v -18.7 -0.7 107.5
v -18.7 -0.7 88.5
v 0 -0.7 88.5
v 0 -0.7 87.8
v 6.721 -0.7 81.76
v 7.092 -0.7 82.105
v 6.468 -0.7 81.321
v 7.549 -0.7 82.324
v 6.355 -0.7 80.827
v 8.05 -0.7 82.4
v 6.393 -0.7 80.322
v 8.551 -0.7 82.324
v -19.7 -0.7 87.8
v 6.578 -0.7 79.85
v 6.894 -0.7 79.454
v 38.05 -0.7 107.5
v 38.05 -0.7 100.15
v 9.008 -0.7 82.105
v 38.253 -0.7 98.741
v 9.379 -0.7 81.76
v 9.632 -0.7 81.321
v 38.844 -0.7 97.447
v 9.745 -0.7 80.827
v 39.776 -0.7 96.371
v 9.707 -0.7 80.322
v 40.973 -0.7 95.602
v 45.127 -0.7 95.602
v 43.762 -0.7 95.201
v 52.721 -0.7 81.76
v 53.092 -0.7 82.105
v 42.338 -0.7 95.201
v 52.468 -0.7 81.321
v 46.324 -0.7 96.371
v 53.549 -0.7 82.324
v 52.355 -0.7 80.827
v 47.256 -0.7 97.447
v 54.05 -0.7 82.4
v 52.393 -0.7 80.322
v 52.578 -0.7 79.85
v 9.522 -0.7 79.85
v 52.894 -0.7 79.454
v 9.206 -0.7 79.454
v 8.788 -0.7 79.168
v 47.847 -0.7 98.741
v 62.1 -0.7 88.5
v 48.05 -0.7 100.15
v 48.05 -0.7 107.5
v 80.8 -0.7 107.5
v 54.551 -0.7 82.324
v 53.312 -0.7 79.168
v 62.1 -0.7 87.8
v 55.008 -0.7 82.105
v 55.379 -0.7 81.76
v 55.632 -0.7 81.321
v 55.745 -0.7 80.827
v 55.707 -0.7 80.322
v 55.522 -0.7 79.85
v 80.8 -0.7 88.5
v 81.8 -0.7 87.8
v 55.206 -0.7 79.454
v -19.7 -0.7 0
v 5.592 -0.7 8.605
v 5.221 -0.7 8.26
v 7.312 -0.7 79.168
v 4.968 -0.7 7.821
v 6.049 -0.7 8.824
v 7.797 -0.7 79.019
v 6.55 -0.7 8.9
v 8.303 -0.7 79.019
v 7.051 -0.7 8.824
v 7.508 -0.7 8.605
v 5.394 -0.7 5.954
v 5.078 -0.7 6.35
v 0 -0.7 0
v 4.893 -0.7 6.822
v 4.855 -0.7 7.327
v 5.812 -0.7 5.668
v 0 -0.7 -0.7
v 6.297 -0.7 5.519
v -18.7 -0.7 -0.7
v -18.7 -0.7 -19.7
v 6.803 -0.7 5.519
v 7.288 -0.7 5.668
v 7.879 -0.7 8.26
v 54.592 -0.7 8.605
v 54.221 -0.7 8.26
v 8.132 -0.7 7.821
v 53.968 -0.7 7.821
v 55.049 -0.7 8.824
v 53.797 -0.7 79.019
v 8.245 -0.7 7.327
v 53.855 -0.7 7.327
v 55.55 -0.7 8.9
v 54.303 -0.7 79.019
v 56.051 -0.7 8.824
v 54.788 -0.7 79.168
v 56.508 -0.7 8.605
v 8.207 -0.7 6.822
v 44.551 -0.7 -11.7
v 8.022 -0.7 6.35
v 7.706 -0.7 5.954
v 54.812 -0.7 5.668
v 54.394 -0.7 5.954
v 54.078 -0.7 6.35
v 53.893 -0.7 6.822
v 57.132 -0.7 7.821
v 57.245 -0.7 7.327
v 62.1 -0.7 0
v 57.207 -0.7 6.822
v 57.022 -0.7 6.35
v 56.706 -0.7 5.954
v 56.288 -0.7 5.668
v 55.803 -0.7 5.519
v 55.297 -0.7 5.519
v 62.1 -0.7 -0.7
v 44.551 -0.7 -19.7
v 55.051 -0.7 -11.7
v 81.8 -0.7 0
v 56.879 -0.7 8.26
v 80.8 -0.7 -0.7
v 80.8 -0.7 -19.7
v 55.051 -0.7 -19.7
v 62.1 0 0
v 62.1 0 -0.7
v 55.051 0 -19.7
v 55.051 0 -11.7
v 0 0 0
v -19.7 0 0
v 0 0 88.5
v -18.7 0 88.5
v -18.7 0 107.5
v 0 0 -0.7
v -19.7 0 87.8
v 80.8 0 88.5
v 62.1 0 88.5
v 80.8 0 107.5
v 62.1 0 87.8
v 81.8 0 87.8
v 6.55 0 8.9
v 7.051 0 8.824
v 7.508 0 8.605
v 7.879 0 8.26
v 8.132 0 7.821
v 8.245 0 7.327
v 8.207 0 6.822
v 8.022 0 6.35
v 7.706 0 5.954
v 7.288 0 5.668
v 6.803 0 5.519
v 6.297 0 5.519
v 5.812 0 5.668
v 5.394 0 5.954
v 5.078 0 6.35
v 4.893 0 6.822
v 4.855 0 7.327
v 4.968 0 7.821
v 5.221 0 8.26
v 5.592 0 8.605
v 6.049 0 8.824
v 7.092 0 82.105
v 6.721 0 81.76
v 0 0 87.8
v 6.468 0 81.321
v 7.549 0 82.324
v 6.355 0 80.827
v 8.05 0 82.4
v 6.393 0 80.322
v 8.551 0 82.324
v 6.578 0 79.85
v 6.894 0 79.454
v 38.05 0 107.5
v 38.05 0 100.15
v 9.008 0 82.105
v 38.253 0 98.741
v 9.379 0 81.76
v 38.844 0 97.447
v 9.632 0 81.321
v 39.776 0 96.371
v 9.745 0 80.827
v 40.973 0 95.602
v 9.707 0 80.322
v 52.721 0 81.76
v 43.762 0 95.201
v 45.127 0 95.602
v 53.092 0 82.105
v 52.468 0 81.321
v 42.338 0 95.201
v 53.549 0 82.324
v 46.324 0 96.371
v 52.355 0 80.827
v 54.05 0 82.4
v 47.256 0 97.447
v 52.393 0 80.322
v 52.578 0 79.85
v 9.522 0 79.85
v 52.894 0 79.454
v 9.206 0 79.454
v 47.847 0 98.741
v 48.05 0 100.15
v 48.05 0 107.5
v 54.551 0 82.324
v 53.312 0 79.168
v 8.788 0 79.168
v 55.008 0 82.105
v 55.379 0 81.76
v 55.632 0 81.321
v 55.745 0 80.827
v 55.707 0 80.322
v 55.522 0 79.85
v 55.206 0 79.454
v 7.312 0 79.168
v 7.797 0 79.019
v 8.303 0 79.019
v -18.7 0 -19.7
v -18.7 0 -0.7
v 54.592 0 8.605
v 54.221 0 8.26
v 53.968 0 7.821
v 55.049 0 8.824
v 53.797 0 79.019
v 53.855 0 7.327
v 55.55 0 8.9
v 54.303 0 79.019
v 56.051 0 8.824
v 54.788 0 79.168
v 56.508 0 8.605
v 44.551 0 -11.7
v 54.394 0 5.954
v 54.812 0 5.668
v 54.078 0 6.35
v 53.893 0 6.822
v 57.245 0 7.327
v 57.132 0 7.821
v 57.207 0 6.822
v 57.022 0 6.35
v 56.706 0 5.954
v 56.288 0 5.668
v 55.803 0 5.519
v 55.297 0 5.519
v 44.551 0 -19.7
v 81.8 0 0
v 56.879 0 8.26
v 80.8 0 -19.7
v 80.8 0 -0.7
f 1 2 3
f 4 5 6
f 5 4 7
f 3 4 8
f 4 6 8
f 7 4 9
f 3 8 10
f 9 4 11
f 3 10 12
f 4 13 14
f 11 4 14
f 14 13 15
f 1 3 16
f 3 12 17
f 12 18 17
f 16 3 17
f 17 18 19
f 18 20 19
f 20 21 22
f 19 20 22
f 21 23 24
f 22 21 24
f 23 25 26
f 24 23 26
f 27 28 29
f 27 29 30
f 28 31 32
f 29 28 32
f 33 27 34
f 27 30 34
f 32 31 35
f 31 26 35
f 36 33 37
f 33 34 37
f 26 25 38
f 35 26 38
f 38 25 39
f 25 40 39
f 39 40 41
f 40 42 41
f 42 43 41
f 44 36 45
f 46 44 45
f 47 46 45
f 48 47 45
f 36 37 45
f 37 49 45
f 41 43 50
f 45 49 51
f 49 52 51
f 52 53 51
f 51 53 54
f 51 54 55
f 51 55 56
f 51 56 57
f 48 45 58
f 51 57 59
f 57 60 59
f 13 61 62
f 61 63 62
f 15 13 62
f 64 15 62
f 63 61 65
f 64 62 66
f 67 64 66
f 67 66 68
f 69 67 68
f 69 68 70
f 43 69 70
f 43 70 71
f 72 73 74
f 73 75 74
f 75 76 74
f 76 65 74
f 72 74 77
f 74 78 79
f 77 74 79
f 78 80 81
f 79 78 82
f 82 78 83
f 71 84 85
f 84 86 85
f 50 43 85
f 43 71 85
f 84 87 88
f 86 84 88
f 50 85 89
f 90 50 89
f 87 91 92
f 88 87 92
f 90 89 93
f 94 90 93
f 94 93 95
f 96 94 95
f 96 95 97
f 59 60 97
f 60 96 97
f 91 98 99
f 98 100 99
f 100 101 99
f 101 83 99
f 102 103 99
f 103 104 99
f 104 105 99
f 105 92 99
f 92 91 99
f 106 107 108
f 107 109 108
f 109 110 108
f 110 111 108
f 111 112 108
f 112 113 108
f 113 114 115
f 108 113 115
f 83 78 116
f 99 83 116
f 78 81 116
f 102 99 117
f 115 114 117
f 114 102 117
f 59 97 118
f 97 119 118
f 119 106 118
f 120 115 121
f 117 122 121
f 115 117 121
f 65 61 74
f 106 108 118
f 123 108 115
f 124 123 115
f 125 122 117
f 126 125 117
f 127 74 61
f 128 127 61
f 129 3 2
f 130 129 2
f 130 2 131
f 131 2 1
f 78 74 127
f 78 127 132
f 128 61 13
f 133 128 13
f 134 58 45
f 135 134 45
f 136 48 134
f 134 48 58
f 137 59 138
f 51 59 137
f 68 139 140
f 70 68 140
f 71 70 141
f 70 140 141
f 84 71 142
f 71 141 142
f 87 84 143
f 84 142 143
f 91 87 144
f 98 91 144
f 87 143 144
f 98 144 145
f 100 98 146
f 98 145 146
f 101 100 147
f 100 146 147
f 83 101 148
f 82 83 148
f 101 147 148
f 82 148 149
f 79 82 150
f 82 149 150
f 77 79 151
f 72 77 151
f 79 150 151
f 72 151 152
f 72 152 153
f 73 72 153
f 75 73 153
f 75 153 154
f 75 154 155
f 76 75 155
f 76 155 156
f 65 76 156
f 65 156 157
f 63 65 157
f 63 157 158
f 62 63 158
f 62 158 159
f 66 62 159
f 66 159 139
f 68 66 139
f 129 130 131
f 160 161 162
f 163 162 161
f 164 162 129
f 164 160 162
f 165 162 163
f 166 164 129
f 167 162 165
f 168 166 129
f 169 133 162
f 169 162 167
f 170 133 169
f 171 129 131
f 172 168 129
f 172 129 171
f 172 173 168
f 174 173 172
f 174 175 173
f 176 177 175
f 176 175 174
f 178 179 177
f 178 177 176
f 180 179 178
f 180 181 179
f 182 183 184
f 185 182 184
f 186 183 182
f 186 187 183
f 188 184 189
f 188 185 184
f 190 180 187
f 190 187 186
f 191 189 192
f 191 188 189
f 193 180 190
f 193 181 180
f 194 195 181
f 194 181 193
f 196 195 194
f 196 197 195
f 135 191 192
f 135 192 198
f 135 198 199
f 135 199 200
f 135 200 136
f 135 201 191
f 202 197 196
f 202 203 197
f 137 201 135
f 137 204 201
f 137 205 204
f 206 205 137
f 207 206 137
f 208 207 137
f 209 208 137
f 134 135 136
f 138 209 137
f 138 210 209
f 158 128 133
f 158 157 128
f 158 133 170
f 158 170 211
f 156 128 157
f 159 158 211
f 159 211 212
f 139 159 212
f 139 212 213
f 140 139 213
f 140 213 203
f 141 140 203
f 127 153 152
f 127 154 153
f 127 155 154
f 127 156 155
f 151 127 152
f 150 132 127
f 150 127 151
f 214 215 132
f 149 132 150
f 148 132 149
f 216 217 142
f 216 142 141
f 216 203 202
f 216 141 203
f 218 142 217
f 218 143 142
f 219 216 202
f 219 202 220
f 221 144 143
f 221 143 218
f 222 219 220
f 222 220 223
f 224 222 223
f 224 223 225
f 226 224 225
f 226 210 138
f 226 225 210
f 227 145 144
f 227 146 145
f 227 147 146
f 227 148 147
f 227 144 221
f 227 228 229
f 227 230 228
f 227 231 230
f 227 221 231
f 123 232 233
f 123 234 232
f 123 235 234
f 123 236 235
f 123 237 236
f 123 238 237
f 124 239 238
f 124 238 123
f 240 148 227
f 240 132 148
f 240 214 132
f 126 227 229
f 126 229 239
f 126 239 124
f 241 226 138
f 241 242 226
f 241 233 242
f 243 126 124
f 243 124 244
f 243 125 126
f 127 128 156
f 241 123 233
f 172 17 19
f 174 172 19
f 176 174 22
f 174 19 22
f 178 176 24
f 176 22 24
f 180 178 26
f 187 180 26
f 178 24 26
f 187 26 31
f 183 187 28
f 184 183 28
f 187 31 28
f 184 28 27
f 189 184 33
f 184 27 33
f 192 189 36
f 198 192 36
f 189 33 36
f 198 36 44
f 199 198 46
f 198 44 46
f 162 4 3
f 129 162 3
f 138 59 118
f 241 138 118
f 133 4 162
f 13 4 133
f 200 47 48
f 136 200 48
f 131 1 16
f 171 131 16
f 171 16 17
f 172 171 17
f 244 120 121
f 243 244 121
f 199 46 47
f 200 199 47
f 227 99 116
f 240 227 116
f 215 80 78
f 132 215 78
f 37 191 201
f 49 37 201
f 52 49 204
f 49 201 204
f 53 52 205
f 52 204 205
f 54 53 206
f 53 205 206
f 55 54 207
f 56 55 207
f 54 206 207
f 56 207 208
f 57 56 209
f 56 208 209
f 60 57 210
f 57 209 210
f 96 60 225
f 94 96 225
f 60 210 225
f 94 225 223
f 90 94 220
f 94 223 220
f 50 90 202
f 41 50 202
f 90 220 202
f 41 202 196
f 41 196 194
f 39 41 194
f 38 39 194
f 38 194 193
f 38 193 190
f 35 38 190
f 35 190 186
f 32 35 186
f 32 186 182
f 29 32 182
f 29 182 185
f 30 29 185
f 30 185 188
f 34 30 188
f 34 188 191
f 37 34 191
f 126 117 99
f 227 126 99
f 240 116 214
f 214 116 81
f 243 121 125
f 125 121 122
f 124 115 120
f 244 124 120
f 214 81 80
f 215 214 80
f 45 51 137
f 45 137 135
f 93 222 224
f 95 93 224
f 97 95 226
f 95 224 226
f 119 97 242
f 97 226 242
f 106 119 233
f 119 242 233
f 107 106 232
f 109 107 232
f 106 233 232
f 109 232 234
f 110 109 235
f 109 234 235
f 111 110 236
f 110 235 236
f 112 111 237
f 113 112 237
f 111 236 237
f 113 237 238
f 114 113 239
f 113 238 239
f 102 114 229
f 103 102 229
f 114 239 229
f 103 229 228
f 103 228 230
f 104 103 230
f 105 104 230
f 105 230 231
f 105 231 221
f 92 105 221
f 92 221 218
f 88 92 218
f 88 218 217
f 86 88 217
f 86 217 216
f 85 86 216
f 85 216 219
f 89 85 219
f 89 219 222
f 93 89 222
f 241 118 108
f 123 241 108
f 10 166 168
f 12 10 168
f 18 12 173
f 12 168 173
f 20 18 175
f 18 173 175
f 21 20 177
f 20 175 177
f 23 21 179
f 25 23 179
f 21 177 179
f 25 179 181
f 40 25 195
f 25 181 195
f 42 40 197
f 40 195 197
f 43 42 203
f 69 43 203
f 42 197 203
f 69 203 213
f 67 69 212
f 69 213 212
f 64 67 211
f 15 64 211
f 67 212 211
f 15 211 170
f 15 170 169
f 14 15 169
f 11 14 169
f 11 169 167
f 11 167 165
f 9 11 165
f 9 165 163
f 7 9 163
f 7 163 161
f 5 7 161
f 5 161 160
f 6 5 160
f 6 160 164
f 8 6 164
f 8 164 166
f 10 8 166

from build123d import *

# Parameters (mm, degrees)
SKETCH1_W                 = 62.1
SKETCH1_H                 = 0.7
BASE_FLANGE1_DEPTH        = 87.8
EDGE_FLANGE1_DEPTH        = 87.8
EDGE_FLANGE2_DEPTH        = 87.8
EDGE_FLANGE3_DEPTH        = 62.1
CUT_EXTRUDE2_DEPTH        = 0.7
SKETCH14_R                = 1.7
CUT_EXTRUDE3_DEPTH        = 0.7
EDGE_FLANGE4_DEPTH        = 19
EDGE_FLANGE5_DEPTH        = 19
EDGE_FLANGE6_DEPTH        = 62.1
EDGE_FLANGE7_DEPTH        = 19
EDGE_FLANGE8_DEPTH        = 19
SKETCH32_W                = 10.5
SKETCH32_H                = 8
CUT_EXTRUDE5_DEPTH        = 0.7
FLAT_PATTERN1_START       = -20.7
FLAT_PATTERN1_OUTLINE_R   = 1.7
FLAT_PATTERN1_DEPTH       = 20
FLAT_PATTERN1_START_2     = -0.7
FLAT_PATTERN1_2_OUTLINE_R = 1.7
FLAT_PATTERN1_2_DEPTH     = 0.7


with BuildPart() as part:
    # Base-Flange1: sheet metal written as solids
    # Sketch1 → Base-Flange1 (new body)
    with BuildSketch(Plane.XY):
        with Locations((31.05, -0.35)):
            Rectangle(SKETCH1_W, SKETCH1_H)
    extrude(amount=BASE_FLANGE1_DEPTH)

    # Edge-Flange1: sheet metal written as solids
    # Edge-Flange1 section (on a plane across the edge) → Edge-Flange1 (add)
    with BuildSketch(Plane(origin=(63.1, -0.7, 0), x_dir=(-1, 0, 0), z_dir=(0, 0, 1))):
        with BuildLine():
            Line((-0.7, 1), (-0.7, 20))
            Line((-0.7, 20), (0, 20))
            Line((0, 20), (0, 1))
            ThreePointArc((0, 1), (0.292893219, 0.292893219), (1, 0))
            Line((1, 0), (1, -0.7))
            ThreePointArc((1, -0.7), (-0.202081528, -0.202081528), (-0.7, 1))
        make_face()
    extrude(amount=EDGE_FLANGE1_DEPTH)

    # Edge-Flange2: sheet metal written as solids
    # Edge-Flange2 section (on a plane across the edge) → Edge-Flange2 (add)
    with BuildSketch(Plane(origin=(-1, -0.7, 87.8), x_dir=(1, 0, 0), z_dir=(0, 0, -1))):
        with BuildLine():
            Line((-0.7, 1), (-0.7, 20))
            Line((-0.7, 20), (0, 20))
            Line((0, 20), (0, 1))
            ThreePointArc((0, 1), (0.292893219, 0.292893219), (1, 0))
            Line((1, 0), (1, -0.7))
            ThreePointArc((1, -0.7), (-0.202081528, -0.202081528), (-0.7, 1))
        make_face()
    extrude(amount=EDGE_FLANGE2_DEPTH)

    # Edge-Flange3: sheet metal written as solids
    # Edge-Flange3 section (on a plane across the edge) → Edge-Flange3 (add)
    with BuildSketch(Plane(origin=(62.1, -0.7, 88.8), x_dir=(0, 0, -1), z_dir=(-1, 0, 0))):
        with BuildLine():
            Line((-0.7, 1), (-0.7, 20))
            Line((-0.7, 20), (0, 20))
            Line((0, 20), (0, 1))
            ThreePointArc((0, 1), (0.292893219, 0.292893219), (1, 0))
            Line((1, 0), (1, -0.7))
            ThreePointArc((1, -0.7), (-0.202081528, -0.202081528), (-0.7, 1))
        make_face()
    extrude(amount=EDGE_FLANGE3_DEPTH)

    # Sketch13 → Cut-Extrude2 (cut)
    with BuildSketch(Plane.XY.offset(89.5)):
        with BuildLine():
            Line((38.05, -13.35), (38.05, -20.7))
            Line((38.05, -20.7), (48.05, -20.7))
            Line((48.05, -20.7), (48.05, -13.35))
            ThreePointArc((48.05, -13.35), (43.05, -8.35), (38.05, -13.35))
        make_face()
    extrude(amount=-CUT_EXTRUDE2_DEPTH, mode=Mode.SUBTRACT)

    # Sketch14 → Cut-Extrude3 (cut)
    with BuildSketch(Plane(origin=(0, 0, 0), x_dir=(1, 0, 0), z_dir=(0, 1, 0))):
        with Locations(Location((6.55, -7.2, 0), (0, 0, 270))):
            Circle(SKETCH14_R)
        with Locations(Location((55.55, -7.2, 0), (0, 0, 270))):
            Circle(SKETCH14_R)
        with Locations(Location((8.05, -80.7, 0), (0, 0, 270))):
            Circle(SKETCH14_R)
        with Locations(Location((54.05, -80.7, 0), (0, 0, 270))):
            Circle(SKETCH14_R)
    extrude(amount=-CUT_EXTRUDE3_DEPTH, mode=Mode.SUBTRACT)

    # Edge-Flange4: sheet metal written as solids
    # Edge-Flange4 section (on a plane across the edge) → Edge-Flange4 (add)
    with BuildSketch(Plane(origin=(64.1, -1.7, 88.8), x_dir=(-1, 0, 0), z_dir=(0, -1, 0))):
        with BuildLine():
            Line((-0.7, 2), (-0.7, 20))
            Line((-0.7, 20), (0, 20))
            Line((0, 20), (0, 2))
            ThreePointArc((0, 2), (0.585786438, 0.585786438), (2, 0))
            Line((2, 0), (2, -0.7))
            ThreePointArc((2, -0.7), (0.090811691, 0.090811691), (-0.7, 2))
        make_face()
    extrude(amount=EDGE_FLANGE4_DEPTH)

    # Edge-Flange5: sheet metal written as solids
    # Edge-Flange5 section (on a plane across the edge) → Edge-Flange5 (add)
    with BuildSketch(Plane(origin=(-2, -20.7, 88.8), x_dir=(1, 0, 0), z_dir=(0, 1, 0))):
        with BuildLine():
            Line((-0.7, 2), (-0.7, 20))
            Line((-0.7, 20), (0, 20))
            Line((0, 20), (0, 2))
            ThreePointArc((0, 2), (0.585786438, 0.585786438), (2, 0))
            Line((2, 0), (2, -0.7))
            ThreePointArc((2, -0.7), (0.090811691, 0.090811691), (-0.7, 2))
        make_face()
    extrude(amount=EDGE_FLANGE5_DEPTH)

    # Edge-Flange6: sheet metal written as solids
    # Edge-Flange6 section (on a plane across the edge) → Edge-Flange6 (add)
    with BuildSketch(Plane(origin=(0, -0.7, -1), x_dir=(0, 0, 1), z_dir=(1, 0, 0))):
        with BuildLine():
            Line((-0.7, 1), (-0.7, 20))
            Line((-0.7, 20), (0, 20))
            Line((0, 20), (0, 1))
            ThreePointArc((0, 1), (0.292893219, 0.292893219), (1, 0))
            Line((1, 0), (1, -0.7))
            ThreePointArc((1, -0.7), (-0.202081528, -0.202081528), (-0.7, 1))
        make_face()
    extrude(amount=EDGE_FLANGE6_DEPTH)

    # Edge-Flange7: sheet metal written as solids
    # Edge-Flange7 section (on a plane across the edge) → Edge-Flange7 (add)
    with BuildSketch(Plane(origin=(64.1, -20.7, -1), x_dir=(-1, 0, 0), z_dir=(0, 1, 0))):
        with BuildLine():
            Line((-0.7, 2), (-0.7, 20))
            Line((-0.7, 20), (0, 20))
            Line((0, 20), (0, 2))
            ThreePointArc((0, 2), (0.585786438, 0.585786438), (2, 0))
            Line((2, 0), (2, -0.7))
            ThreePointArc((2, -0.7), (0.090811691, 0.090811691), (-0.7, 2))
        make_face()
    extrude(amount=EDGE_FLANGE7_DEPTH)

    # Edge-Flange8: sheet metal written as solids
    # Edge-Flange8 section (on a plane across the edge) → Edge-Flange8 (add)
    with BuildSketch(Plane(origin=(-2, -1.7, -1), x_dir=(1, 0, 0), z_dir=(0, -1, 0))):
        with BuildLine():
            Line((-0.7, 2), (-0.7, 20))
            Line((-0.7, 20), (0, 20))
            Line((0, 20), (0, 2))
            ThreePointArc((0, 2), (0.585786438, 0.585786438), (2, 0))
            Line((2, 0), (2, -0.7))
            ThreePointArc((2, -0.7), (0.090811691, 0.090811691), (-0.7, 2))
        make_face()
    extrude(amount=EDGE_FLANGE8_DEPTH)

    # Sketch32 → Cut-Extrude5 (cut)
    with BuildSketch(Plane(origin=(0, 0, -1.7), x_dir=(-1, 0, 0), z_dir=(0, 0, -1))):
        with Locations((-49.8006007, -16.7)):
            Rectangle(SKETCH32_W, SKETCH32_H)
    extrude(amount=-CUT_EXTRUDE5_DEPTH, mode=Mode.SUBTRACT)

    # Flat-Pattern1: read off the stored shape, not the designer's step
    # Flat-Pattern1 outline → Flat-Pattern1 (cut)
    with BuildSketch(Plane(origin=(0, 0, 0), x_dir=(1, 0, 0), z_dir=(0, 1, 0)).offset(FLAT_PATTERN1_START)):
        with BuildLine():
            Line((-1.7, 0), (-1.7, -87.8))
            Line((-1.7, -87.8), (0, -87.8))
            Line((0, -87.8), (0, -88.5))
            Line((0, -88.5), (-1.053565375, -88.5))
            ThreePointArc((-1.053565375, -88.5), (-1.747445385, -87.772848716), (-2, -86.8))
            Line((-2, -86.8), (-2, -68.8))
            Line((-2, -68.8), (-2.7, -68.8))
            Line((-2.7, -68.8), (-2.7, -86.8))
            ThreePointArc((-2.7, -86.8), (-2.54495263, -87.701784958), (-2.097617696, -88.5))
            Line((-2.097617696, -88.5), (-18.7, -88.5))
            Line((-18.7, -88.5), (-18.7, -107.5))
            Line((-18.7, -107.5), (38.05, -107.5))
            Line((38.05, -107.5), (38.05, -100.15))
            ThreePointArc((38.05, -100.15), (43.05, -95.15), (48.05, -100.15))
            Line((48.05, -100.15), (48.05, -107.5))
            Line((48.05, -107.5), (80.8, -107.5))
            Line((80.8, -107.5), (80.8, -88.5))
            Line((80.8, -88.5), (64.197617696, -88.5))
            ThreePointArc((64.197617696, -88.5), (64.64495263, -87.701784958), (64.8, -86.8))
            Line((64.8, -86.8), (64.8, -68.8))
            Line((64.8, -68.8), (64.1, -68.8))
            Line((64.1, -68.8), (64.1, -86.8))
            ThreePointArc((64.1, -86.8), (63.847445385, -87.772848716), (63.153565375, -88.5))
            Line((63.153565375, -88.5), (62.1, -88.5))
            Line((62.1, -88.5), (62.1, -87.8))
            Line((62.1, -87.8), (63.8, -87.8))
            Line((63.8, -87.8), (63.8, 0))
            Line((63.8, 0), (62.1, 0))
            Line((62.1, 0), (62.1, 0.7))
            Line((62.1, 0.7), (63.153565375, 0.7))
            ThreePointArc((63.153565375, 0.7), (63.847445385, -0.027151284), (64.1, -1))
            Line((64.1, -1), (64.1, -19))
            Line((64.1, -19), (64.8, -19))
            Line((64.8, -19), (64.8, -1))
            ThreePointArc((64.8, -1), (64.009188309, 0.909188309), (62.1, 1.7))
            Line((62.1, 1.7), (0, 1.7))
            ThreePointArc((0, 1.7), (-1.909188309, 0.909188309), (-2.7, -1))
            Line((-2.7, -1), (-2.7, -19))
            Line((-2.7, -19), (-2, -19))
            Line((-2, -19), (-2, -1))
            ThreePointArc((-2, -1), (-1.747445385, -0.027151284), (-1.053565375, 0.7))
            Line((-1.053565375, 0.7), (0, 0.7))
            Line((0, 0.7), (0, 0))
            Line((0, 0), (-1.7, 0))
        make_face()
        with Locations((55.55, -7.2)):
            Circle(FLAT_PATTERN1_OUTLINE_R, mode=Mode.SUBTRACT)
        with Locations((8.05, -80.7)):
            Circle(FLAT_PATTERN1_OUTLINE_R, mode=Mode.SUBTRACT)
        with Locations((54.05, -80.7)):
            Circle(FLAT_PATTERN1_OUTLINE_R, mode=Mode.SUBTRACT)
        with Locations((6.55, -7.2)):
            Circle(FLAT_PATTERN1_OUTLINE_R, mode=Mode.SUBTRACT)
    extrude(amount=FLAT_PATTERN1_DEPTH, mode=Mode.SUBTRACT)

    # Flat-Pattern1 2 outline → Flat-Pattern1 2 (add)
    with BuildSketch(Plane(origin=(0, 0, 0), x_dir=(1, 0, 0), z_dir=(0, 1, 0)).offset(FLAT_PATTERN1_START_2)):
        with BuildLine():
            Line((0, -87.8), (0, -88.5))
            Line((0, -88.5), (-18.7, -88.5))
            Line((-18.7, -88.5), (-18.7, -107.5))
            Line((-18.7, -107.5), (38.05, -107.5))
            Line((38.05, -107.5), (38.05, -100.15))
            ThreePointArc((38.05, -100.15), (43.05, -95.15), (48.05, -100.15))
            Line((48.05, -100.15), (48.05, -107.5))
            Line((48.05, -107.5), (80.8, -107.5))
            Line((80.8, -107.5), (80.8, -88.5))
            Line((80.8, -88.5), (62.1, -88.5))
            Line((62.1, -88.5), (62.1, -87.8))
            Line((62.1, -87.8), (81.8, -87.8))
            Line((81.8, -87.8), (81.8, 0))
            Line((81.8, 0), (62.1, 0))
            Line((62.1, 0), (62.1, 0.7))
            Line((62.1, 0.7), (80.8, 0.7))
            Line((80.8, 0.7), (80.8, 19.7))
            Line((80.8, 19.7), (55.0506007, 19.7))
            Line((55.0506007, 19.7), (55.0506007, 11.7))
            Line((55.0506007, 11.7), (44.5506007, 11.7))
            Line((44.5506007, 11.7), (44.5506007, 19.7))
            Line((44.5506007, 19.7), (-18.7, 19.7))
            Line((-18.7, 19.7), (-18.7, 0.7))
            Line((-18.7, 0.7), (0, 0.7))
            Line((0, 0.7), (0, 0))
            Line((0, 0), (-19.7, 0))
            Line((-19.7, 0), (-19.7, -87.8))
            Line((-19.7, -87.8), (0, -87.8))
        make_face()
        with Locations((55.55, -7.2)):
            Circle(FLAT_PATTERN1_2_OUTLINE_R, mode=Mode.SUBTRACT)
        with Locations((8.05, -80.7)):
            Circle(FLAT_PATTERN1_2_OUTLINE_R, mode=Mode.SUBTRACT)
        with Locations((54.05, -80.7)):
            Circle(FLAT_PATTERN1_2_OUTLINE_R, mode=Mode.SUBTRACT)
        with Locations((6.55, -7.2)):
            Circle(FLAT_PATTERN1_2_OUTLINE_R, mode=Mode.SUBTRACT)
    extrude(amount=FLAT_PATTERN1_2_DEPTH)


solid = part.part
